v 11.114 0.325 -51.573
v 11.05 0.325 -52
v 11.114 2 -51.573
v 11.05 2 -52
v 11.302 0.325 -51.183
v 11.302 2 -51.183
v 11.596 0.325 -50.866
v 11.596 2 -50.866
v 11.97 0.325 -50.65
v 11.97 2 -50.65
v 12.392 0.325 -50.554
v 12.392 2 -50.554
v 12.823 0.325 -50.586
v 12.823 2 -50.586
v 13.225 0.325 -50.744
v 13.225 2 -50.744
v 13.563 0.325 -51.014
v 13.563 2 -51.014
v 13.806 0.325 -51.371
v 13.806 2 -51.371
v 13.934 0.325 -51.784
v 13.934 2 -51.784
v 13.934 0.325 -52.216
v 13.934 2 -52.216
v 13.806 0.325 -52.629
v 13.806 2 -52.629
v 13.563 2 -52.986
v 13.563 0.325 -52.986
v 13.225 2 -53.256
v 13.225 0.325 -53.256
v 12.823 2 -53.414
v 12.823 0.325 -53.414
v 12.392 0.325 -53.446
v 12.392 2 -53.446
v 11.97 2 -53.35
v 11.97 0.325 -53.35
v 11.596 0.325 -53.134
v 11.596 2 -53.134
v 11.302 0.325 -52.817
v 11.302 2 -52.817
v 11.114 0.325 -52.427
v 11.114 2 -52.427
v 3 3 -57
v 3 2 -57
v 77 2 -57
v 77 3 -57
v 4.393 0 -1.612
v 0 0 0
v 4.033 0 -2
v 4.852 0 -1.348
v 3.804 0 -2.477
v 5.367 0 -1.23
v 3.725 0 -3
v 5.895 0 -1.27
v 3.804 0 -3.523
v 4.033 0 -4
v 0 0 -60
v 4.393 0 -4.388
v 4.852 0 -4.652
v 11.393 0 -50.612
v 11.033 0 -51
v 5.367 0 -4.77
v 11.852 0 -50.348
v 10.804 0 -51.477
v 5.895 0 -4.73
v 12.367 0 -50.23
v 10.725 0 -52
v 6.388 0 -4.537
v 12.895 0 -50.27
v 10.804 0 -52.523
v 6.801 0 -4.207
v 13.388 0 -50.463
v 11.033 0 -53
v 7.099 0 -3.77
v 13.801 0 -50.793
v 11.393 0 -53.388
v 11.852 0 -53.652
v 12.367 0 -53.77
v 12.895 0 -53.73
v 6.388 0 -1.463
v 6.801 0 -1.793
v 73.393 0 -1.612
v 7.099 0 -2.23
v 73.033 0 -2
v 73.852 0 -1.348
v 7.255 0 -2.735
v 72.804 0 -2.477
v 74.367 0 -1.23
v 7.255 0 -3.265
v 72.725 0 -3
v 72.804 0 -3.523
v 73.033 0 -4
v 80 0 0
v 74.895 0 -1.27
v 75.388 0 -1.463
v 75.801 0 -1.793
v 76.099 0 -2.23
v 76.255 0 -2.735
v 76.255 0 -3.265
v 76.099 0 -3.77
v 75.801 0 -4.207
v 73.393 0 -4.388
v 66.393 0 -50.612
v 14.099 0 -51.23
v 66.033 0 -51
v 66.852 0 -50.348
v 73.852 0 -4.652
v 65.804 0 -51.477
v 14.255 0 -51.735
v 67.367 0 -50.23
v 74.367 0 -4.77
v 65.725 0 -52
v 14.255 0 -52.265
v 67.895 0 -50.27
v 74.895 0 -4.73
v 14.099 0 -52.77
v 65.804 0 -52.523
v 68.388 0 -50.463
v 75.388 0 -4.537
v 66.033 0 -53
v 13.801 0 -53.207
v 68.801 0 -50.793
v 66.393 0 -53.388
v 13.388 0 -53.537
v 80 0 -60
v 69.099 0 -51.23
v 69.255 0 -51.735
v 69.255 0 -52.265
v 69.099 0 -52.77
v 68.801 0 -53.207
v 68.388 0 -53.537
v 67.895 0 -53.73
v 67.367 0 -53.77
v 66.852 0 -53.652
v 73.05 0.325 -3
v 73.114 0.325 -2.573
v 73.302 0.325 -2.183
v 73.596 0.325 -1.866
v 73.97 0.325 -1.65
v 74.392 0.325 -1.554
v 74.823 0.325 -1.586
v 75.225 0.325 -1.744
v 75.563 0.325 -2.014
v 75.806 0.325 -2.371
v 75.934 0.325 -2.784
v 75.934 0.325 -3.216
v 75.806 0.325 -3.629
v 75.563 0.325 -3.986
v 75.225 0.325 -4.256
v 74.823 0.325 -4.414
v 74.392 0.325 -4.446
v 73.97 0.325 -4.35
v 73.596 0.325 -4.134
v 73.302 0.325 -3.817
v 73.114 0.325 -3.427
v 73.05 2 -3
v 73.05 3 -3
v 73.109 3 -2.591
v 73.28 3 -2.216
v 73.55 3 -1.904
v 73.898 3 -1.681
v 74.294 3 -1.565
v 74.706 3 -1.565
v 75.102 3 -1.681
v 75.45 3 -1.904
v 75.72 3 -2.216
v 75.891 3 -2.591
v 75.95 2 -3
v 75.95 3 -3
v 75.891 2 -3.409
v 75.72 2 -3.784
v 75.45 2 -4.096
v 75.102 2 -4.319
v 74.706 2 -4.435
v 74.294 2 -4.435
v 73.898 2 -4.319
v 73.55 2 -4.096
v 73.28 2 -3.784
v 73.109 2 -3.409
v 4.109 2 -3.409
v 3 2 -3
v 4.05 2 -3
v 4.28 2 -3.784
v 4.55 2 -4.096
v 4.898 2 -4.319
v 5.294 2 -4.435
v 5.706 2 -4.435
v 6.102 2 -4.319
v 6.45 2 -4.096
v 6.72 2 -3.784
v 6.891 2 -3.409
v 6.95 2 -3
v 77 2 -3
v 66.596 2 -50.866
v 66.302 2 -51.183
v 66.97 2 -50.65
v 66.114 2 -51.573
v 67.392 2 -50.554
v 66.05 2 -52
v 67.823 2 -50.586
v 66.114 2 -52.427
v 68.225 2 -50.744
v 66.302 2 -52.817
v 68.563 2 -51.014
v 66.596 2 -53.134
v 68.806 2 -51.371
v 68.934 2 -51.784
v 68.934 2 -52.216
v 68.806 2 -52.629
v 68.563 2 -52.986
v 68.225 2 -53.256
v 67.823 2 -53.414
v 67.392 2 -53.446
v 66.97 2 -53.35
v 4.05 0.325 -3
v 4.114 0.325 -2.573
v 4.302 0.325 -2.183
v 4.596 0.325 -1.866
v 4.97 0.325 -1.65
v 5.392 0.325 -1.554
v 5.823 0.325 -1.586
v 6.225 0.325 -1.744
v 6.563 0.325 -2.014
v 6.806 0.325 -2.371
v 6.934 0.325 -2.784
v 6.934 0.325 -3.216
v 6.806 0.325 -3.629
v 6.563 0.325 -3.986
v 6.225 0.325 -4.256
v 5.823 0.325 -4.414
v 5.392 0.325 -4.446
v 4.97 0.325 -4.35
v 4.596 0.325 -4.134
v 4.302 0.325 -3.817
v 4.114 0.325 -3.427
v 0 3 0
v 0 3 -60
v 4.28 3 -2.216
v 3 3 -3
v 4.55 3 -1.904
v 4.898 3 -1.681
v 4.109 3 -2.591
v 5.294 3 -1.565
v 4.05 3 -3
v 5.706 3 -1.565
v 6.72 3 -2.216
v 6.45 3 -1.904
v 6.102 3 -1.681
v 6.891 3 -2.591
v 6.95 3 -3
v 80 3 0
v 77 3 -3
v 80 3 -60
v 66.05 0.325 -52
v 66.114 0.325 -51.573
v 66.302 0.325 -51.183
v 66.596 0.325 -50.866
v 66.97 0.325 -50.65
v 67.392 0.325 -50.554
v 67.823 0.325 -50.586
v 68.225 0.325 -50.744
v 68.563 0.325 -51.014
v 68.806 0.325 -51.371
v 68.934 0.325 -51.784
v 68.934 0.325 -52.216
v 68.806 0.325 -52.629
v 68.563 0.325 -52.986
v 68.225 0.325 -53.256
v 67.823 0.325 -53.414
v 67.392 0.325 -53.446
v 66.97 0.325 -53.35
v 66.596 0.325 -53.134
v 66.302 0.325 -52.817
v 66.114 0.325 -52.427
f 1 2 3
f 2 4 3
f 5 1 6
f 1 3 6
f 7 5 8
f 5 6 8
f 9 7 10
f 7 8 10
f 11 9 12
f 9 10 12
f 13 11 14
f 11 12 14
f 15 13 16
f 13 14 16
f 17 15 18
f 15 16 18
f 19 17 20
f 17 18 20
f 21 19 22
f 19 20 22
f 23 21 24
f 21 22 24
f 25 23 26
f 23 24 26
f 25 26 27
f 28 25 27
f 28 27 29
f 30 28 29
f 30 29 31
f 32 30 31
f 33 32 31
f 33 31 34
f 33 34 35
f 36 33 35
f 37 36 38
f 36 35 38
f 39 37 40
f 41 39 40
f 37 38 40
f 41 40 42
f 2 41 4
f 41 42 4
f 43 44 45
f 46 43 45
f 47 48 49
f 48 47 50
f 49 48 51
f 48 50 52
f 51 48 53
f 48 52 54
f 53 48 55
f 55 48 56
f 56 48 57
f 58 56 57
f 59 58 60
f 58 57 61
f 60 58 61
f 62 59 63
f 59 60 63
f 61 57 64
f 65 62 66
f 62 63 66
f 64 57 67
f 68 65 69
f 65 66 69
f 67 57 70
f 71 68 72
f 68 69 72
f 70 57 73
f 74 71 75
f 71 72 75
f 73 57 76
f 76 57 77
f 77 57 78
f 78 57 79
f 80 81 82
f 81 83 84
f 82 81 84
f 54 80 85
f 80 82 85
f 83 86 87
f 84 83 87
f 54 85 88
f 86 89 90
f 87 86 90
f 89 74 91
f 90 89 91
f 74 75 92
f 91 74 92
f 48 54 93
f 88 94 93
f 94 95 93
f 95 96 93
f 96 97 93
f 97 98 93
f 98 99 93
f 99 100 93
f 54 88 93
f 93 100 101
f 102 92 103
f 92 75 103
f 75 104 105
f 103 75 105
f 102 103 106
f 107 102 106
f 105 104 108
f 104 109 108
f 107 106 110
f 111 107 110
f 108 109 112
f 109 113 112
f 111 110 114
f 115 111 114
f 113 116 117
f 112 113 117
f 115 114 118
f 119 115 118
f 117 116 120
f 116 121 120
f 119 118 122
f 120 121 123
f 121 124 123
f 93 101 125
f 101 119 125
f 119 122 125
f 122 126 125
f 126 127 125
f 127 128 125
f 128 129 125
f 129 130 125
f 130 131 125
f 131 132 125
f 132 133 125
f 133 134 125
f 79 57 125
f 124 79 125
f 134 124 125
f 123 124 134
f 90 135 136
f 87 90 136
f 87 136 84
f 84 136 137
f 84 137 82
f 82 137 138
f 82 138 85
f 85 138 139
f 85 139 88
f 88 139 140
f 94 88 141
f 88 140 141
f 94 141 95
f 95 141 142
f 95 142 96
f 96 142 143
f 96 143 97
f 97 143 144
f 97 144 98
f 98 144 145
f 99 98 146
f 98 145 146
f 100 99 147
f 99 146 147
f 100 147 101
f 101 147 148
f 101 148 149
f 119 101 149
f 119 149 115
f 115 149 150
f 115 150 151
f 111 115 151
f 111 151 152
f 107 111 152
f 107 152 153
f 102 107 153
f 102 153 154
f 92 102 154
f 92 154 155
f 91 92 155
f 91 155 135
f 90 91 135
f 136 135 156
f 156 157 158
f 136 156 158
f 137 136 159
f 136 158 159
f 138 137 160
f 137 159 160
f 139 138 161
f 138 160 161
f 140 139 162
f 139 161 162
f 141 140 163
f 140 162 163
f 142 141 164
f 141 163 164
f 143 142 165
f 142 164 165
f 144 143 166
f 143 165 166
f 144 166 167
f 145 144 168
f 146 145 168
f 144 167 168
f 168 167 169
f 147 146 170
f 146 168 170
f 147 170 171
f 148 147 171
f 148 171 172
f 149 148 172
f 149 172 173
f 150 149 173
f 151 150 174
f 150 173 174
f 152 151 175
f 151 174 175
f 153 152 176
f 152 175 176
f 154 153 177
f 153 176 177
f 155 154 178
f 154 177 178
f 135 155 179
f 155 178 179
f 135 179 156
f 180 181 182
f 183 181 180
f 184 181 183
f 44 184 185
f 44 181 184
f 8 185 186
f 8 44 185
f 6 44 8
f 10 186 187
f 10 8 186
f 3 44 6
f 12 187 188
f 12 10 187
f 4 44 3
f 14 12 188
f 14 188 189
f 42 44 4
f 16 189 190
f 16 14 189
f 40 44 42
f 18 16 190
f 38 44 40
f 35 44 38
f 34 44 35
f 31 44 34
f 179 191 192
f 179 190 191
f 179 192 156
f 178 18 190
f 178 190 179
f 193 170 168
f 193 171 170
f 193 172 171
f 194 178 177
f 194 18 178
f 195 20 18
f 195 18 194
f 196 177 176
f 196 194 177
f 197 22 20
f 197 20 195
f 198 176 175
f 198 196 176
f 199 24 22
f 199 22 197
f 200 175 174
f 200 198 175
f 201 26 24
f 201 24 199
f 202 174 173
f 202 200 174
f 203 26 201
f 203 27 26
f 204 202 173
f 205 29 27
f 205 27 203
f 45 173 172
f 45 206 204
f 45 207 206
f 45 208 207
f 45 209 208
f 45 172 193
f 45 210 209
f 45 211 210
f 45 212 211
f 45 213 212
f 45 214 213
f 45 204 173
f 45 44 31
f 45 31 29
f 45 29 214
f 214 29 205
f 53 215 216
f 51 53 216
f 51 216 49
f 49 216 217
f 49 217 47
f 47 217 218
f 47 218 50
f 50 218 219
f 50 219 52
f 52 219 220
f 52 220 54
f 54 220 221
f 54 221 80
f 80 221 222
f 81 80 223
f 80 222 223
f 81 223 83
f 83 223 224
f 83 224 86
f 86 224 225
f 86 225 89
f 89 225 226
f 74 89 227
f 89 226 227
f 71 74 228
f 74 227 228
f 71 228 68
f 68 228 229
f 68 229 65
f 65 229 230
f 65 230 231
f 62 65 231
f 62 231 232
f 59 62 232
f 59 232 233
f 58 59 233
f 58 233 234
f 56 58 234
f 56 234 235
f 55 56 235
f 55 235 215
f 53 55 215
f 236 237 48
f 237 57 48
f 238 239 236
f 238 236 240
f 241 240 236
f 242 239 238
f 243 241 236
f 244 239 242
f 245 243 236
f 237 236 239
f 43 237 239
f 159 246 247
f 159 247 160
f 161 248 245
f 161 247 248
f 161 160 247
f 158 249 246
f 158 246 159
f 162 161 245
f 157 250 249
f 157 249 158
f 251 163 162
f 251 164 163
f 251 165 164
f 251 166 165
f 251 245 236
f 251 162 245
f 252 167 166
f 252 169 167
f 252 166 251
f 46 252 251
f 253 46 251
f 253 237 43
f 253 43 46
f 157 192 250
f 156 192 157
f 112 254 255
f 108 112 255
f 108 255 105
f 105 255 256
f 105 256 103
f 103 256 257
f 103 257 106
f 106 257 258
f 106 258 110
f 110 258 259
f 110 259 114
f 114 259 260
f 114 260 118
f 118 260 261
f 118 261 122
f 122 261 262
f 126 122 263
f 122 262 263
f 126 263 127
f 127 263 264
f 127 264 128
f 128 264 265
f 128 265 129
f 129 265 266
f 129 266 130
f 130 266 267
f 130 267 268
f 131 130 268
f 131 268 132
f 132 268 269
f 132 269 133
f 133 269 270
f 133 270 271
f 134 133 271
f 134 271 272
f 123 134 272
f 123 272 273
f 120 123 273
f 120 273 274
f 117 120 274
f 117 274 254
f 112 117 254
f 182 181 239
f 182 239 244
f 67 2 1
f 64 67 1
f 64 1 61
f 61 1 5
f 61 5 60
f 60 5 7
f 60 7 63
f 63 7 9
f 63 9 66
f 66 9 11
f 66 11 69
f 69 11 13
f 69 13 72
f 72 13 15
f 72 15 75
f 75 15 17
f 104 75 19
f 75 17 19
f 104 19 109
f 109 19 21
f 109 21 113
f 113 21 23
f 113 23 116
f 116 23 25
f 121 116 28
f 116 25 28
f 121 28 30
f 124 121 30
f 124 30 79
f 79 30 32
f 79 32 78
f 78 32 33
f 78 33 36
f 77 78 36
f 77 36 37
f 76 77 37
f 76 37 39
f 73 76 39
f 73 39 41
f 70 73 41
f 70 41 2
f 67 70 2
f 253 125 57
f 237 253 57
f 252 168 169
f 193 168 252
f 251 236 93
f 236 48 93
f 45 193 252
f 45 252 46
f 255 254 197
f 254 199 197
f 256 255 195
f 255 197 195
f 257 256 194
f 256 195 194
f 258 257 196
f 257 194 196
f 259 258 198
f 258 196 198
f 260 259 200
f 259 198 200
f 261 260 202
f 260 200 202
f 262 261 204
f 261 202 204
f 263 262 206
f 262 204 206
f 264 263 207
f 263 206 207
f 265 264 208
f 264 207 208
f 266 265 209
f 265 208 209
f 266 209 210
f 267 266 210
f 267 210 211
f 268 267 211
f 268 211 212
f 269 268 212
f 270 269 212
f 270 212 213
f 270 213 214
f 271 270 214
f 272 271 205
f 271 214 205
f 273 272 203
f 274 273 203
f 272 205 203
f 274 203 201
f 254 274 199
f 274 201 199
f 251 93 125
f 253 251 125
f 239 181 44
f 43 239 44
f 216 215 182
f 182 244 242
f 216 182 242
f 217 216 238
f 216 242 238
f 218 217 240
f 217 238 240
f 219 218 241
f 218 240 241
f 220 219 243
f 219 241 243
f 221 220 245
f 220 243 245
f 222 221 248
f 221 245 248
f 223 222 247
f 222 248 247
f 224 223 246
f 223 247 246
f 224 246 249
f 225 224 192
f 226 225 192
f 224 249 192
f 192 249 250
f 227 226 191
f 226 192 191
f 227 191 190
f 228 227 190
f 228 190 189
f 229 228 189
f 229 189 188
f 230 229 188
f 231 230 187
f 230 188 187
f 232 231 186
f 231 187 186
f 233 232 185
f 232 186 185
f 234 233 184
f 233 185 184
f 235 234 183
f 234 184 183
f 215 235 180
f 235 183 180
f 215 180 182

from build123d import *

# Parameters (mm, degrees)
SKETCH_1_W                     = 80
SKETCH_1_H                     = 60
EXTRUDE_1_DEPTH                = 2
SKETCH_2_W                     = 74
SKETCH_2_H                     = 54
EXTRUDE_2_DEPTH                = 1
HOLE_WIZARD_M3_5_1_D           = 2.9
HOLE_WIZARD_M3_5_1_DEPTH       = 8.8
HOLE_WIZARD_M3_5_1_CSINK_D     = 3.55
HOLE_WIZARD_M3_5_1_CSINK_ANGLE = 90
HOLE_WIZARD_M3_5_1_TIP         = 0.871247898


with BuildPart() as part:
    # 草图1 → 凸台-拉伸1 (new body)
    with BuildSketch(Plane(origin=(0, 0, 0), x_dir=(1, 0, 0), z_dir=(0, 1, 0))):
        with Locations((40, 30)):
            Rectangle(SKETCH_1_W, SKETCH_1_H)
    extrude(amount=EXTRUDE_1_DEPTH)

    # 草图2 → 凸台-拉伸2 (add)
    with BuildSketch(Plane(origin=(0, 2, 0), x_dir=(1, 0, 0), z_dir=(0, 1, 0))):
        Polygon((80, 60), (0, 60), (0, 57), (0, 0), (80, 0), align=None)
        with Locations((40, 30)):
            Rectangle(SKETCH_2_W, SKETCH_2_H, mode=Mode.SUBTRACT)
    extrude(amount=EXTRUDE_2_DEPTH)

    # M3.5 螺纹孔1
    with Locations(Plane.XZ):
        with Locations((5.5, -3), (74.5, -3), (12.5, -52), (67.5, -52)):
            CounterSinkHole(HOLE_WIZARD_M3_5_1_D / 2, HOLE_WIZARD_M3_5_1_CSINK_D / 2, depth=HOLE_WIZARD_M3_5_1_DEPTH, counter_sink_angle=HOLE_WIZARD_M3_5_1_CSINK_ANGLE)
            with Locations((0, 0, -(HOLE_WIZARD_M3_5_1_DEPTH + HOLE_WIZARD_M3_5_1_TIP / 2))):  # 118° drill point
                Cone(0, HOLE_WIZARD_M3_5_1_D / 2, HOLE_WIZARD_M3_5_1_TIP, mode=Mode.SUBTRACT)


solid = part.part
